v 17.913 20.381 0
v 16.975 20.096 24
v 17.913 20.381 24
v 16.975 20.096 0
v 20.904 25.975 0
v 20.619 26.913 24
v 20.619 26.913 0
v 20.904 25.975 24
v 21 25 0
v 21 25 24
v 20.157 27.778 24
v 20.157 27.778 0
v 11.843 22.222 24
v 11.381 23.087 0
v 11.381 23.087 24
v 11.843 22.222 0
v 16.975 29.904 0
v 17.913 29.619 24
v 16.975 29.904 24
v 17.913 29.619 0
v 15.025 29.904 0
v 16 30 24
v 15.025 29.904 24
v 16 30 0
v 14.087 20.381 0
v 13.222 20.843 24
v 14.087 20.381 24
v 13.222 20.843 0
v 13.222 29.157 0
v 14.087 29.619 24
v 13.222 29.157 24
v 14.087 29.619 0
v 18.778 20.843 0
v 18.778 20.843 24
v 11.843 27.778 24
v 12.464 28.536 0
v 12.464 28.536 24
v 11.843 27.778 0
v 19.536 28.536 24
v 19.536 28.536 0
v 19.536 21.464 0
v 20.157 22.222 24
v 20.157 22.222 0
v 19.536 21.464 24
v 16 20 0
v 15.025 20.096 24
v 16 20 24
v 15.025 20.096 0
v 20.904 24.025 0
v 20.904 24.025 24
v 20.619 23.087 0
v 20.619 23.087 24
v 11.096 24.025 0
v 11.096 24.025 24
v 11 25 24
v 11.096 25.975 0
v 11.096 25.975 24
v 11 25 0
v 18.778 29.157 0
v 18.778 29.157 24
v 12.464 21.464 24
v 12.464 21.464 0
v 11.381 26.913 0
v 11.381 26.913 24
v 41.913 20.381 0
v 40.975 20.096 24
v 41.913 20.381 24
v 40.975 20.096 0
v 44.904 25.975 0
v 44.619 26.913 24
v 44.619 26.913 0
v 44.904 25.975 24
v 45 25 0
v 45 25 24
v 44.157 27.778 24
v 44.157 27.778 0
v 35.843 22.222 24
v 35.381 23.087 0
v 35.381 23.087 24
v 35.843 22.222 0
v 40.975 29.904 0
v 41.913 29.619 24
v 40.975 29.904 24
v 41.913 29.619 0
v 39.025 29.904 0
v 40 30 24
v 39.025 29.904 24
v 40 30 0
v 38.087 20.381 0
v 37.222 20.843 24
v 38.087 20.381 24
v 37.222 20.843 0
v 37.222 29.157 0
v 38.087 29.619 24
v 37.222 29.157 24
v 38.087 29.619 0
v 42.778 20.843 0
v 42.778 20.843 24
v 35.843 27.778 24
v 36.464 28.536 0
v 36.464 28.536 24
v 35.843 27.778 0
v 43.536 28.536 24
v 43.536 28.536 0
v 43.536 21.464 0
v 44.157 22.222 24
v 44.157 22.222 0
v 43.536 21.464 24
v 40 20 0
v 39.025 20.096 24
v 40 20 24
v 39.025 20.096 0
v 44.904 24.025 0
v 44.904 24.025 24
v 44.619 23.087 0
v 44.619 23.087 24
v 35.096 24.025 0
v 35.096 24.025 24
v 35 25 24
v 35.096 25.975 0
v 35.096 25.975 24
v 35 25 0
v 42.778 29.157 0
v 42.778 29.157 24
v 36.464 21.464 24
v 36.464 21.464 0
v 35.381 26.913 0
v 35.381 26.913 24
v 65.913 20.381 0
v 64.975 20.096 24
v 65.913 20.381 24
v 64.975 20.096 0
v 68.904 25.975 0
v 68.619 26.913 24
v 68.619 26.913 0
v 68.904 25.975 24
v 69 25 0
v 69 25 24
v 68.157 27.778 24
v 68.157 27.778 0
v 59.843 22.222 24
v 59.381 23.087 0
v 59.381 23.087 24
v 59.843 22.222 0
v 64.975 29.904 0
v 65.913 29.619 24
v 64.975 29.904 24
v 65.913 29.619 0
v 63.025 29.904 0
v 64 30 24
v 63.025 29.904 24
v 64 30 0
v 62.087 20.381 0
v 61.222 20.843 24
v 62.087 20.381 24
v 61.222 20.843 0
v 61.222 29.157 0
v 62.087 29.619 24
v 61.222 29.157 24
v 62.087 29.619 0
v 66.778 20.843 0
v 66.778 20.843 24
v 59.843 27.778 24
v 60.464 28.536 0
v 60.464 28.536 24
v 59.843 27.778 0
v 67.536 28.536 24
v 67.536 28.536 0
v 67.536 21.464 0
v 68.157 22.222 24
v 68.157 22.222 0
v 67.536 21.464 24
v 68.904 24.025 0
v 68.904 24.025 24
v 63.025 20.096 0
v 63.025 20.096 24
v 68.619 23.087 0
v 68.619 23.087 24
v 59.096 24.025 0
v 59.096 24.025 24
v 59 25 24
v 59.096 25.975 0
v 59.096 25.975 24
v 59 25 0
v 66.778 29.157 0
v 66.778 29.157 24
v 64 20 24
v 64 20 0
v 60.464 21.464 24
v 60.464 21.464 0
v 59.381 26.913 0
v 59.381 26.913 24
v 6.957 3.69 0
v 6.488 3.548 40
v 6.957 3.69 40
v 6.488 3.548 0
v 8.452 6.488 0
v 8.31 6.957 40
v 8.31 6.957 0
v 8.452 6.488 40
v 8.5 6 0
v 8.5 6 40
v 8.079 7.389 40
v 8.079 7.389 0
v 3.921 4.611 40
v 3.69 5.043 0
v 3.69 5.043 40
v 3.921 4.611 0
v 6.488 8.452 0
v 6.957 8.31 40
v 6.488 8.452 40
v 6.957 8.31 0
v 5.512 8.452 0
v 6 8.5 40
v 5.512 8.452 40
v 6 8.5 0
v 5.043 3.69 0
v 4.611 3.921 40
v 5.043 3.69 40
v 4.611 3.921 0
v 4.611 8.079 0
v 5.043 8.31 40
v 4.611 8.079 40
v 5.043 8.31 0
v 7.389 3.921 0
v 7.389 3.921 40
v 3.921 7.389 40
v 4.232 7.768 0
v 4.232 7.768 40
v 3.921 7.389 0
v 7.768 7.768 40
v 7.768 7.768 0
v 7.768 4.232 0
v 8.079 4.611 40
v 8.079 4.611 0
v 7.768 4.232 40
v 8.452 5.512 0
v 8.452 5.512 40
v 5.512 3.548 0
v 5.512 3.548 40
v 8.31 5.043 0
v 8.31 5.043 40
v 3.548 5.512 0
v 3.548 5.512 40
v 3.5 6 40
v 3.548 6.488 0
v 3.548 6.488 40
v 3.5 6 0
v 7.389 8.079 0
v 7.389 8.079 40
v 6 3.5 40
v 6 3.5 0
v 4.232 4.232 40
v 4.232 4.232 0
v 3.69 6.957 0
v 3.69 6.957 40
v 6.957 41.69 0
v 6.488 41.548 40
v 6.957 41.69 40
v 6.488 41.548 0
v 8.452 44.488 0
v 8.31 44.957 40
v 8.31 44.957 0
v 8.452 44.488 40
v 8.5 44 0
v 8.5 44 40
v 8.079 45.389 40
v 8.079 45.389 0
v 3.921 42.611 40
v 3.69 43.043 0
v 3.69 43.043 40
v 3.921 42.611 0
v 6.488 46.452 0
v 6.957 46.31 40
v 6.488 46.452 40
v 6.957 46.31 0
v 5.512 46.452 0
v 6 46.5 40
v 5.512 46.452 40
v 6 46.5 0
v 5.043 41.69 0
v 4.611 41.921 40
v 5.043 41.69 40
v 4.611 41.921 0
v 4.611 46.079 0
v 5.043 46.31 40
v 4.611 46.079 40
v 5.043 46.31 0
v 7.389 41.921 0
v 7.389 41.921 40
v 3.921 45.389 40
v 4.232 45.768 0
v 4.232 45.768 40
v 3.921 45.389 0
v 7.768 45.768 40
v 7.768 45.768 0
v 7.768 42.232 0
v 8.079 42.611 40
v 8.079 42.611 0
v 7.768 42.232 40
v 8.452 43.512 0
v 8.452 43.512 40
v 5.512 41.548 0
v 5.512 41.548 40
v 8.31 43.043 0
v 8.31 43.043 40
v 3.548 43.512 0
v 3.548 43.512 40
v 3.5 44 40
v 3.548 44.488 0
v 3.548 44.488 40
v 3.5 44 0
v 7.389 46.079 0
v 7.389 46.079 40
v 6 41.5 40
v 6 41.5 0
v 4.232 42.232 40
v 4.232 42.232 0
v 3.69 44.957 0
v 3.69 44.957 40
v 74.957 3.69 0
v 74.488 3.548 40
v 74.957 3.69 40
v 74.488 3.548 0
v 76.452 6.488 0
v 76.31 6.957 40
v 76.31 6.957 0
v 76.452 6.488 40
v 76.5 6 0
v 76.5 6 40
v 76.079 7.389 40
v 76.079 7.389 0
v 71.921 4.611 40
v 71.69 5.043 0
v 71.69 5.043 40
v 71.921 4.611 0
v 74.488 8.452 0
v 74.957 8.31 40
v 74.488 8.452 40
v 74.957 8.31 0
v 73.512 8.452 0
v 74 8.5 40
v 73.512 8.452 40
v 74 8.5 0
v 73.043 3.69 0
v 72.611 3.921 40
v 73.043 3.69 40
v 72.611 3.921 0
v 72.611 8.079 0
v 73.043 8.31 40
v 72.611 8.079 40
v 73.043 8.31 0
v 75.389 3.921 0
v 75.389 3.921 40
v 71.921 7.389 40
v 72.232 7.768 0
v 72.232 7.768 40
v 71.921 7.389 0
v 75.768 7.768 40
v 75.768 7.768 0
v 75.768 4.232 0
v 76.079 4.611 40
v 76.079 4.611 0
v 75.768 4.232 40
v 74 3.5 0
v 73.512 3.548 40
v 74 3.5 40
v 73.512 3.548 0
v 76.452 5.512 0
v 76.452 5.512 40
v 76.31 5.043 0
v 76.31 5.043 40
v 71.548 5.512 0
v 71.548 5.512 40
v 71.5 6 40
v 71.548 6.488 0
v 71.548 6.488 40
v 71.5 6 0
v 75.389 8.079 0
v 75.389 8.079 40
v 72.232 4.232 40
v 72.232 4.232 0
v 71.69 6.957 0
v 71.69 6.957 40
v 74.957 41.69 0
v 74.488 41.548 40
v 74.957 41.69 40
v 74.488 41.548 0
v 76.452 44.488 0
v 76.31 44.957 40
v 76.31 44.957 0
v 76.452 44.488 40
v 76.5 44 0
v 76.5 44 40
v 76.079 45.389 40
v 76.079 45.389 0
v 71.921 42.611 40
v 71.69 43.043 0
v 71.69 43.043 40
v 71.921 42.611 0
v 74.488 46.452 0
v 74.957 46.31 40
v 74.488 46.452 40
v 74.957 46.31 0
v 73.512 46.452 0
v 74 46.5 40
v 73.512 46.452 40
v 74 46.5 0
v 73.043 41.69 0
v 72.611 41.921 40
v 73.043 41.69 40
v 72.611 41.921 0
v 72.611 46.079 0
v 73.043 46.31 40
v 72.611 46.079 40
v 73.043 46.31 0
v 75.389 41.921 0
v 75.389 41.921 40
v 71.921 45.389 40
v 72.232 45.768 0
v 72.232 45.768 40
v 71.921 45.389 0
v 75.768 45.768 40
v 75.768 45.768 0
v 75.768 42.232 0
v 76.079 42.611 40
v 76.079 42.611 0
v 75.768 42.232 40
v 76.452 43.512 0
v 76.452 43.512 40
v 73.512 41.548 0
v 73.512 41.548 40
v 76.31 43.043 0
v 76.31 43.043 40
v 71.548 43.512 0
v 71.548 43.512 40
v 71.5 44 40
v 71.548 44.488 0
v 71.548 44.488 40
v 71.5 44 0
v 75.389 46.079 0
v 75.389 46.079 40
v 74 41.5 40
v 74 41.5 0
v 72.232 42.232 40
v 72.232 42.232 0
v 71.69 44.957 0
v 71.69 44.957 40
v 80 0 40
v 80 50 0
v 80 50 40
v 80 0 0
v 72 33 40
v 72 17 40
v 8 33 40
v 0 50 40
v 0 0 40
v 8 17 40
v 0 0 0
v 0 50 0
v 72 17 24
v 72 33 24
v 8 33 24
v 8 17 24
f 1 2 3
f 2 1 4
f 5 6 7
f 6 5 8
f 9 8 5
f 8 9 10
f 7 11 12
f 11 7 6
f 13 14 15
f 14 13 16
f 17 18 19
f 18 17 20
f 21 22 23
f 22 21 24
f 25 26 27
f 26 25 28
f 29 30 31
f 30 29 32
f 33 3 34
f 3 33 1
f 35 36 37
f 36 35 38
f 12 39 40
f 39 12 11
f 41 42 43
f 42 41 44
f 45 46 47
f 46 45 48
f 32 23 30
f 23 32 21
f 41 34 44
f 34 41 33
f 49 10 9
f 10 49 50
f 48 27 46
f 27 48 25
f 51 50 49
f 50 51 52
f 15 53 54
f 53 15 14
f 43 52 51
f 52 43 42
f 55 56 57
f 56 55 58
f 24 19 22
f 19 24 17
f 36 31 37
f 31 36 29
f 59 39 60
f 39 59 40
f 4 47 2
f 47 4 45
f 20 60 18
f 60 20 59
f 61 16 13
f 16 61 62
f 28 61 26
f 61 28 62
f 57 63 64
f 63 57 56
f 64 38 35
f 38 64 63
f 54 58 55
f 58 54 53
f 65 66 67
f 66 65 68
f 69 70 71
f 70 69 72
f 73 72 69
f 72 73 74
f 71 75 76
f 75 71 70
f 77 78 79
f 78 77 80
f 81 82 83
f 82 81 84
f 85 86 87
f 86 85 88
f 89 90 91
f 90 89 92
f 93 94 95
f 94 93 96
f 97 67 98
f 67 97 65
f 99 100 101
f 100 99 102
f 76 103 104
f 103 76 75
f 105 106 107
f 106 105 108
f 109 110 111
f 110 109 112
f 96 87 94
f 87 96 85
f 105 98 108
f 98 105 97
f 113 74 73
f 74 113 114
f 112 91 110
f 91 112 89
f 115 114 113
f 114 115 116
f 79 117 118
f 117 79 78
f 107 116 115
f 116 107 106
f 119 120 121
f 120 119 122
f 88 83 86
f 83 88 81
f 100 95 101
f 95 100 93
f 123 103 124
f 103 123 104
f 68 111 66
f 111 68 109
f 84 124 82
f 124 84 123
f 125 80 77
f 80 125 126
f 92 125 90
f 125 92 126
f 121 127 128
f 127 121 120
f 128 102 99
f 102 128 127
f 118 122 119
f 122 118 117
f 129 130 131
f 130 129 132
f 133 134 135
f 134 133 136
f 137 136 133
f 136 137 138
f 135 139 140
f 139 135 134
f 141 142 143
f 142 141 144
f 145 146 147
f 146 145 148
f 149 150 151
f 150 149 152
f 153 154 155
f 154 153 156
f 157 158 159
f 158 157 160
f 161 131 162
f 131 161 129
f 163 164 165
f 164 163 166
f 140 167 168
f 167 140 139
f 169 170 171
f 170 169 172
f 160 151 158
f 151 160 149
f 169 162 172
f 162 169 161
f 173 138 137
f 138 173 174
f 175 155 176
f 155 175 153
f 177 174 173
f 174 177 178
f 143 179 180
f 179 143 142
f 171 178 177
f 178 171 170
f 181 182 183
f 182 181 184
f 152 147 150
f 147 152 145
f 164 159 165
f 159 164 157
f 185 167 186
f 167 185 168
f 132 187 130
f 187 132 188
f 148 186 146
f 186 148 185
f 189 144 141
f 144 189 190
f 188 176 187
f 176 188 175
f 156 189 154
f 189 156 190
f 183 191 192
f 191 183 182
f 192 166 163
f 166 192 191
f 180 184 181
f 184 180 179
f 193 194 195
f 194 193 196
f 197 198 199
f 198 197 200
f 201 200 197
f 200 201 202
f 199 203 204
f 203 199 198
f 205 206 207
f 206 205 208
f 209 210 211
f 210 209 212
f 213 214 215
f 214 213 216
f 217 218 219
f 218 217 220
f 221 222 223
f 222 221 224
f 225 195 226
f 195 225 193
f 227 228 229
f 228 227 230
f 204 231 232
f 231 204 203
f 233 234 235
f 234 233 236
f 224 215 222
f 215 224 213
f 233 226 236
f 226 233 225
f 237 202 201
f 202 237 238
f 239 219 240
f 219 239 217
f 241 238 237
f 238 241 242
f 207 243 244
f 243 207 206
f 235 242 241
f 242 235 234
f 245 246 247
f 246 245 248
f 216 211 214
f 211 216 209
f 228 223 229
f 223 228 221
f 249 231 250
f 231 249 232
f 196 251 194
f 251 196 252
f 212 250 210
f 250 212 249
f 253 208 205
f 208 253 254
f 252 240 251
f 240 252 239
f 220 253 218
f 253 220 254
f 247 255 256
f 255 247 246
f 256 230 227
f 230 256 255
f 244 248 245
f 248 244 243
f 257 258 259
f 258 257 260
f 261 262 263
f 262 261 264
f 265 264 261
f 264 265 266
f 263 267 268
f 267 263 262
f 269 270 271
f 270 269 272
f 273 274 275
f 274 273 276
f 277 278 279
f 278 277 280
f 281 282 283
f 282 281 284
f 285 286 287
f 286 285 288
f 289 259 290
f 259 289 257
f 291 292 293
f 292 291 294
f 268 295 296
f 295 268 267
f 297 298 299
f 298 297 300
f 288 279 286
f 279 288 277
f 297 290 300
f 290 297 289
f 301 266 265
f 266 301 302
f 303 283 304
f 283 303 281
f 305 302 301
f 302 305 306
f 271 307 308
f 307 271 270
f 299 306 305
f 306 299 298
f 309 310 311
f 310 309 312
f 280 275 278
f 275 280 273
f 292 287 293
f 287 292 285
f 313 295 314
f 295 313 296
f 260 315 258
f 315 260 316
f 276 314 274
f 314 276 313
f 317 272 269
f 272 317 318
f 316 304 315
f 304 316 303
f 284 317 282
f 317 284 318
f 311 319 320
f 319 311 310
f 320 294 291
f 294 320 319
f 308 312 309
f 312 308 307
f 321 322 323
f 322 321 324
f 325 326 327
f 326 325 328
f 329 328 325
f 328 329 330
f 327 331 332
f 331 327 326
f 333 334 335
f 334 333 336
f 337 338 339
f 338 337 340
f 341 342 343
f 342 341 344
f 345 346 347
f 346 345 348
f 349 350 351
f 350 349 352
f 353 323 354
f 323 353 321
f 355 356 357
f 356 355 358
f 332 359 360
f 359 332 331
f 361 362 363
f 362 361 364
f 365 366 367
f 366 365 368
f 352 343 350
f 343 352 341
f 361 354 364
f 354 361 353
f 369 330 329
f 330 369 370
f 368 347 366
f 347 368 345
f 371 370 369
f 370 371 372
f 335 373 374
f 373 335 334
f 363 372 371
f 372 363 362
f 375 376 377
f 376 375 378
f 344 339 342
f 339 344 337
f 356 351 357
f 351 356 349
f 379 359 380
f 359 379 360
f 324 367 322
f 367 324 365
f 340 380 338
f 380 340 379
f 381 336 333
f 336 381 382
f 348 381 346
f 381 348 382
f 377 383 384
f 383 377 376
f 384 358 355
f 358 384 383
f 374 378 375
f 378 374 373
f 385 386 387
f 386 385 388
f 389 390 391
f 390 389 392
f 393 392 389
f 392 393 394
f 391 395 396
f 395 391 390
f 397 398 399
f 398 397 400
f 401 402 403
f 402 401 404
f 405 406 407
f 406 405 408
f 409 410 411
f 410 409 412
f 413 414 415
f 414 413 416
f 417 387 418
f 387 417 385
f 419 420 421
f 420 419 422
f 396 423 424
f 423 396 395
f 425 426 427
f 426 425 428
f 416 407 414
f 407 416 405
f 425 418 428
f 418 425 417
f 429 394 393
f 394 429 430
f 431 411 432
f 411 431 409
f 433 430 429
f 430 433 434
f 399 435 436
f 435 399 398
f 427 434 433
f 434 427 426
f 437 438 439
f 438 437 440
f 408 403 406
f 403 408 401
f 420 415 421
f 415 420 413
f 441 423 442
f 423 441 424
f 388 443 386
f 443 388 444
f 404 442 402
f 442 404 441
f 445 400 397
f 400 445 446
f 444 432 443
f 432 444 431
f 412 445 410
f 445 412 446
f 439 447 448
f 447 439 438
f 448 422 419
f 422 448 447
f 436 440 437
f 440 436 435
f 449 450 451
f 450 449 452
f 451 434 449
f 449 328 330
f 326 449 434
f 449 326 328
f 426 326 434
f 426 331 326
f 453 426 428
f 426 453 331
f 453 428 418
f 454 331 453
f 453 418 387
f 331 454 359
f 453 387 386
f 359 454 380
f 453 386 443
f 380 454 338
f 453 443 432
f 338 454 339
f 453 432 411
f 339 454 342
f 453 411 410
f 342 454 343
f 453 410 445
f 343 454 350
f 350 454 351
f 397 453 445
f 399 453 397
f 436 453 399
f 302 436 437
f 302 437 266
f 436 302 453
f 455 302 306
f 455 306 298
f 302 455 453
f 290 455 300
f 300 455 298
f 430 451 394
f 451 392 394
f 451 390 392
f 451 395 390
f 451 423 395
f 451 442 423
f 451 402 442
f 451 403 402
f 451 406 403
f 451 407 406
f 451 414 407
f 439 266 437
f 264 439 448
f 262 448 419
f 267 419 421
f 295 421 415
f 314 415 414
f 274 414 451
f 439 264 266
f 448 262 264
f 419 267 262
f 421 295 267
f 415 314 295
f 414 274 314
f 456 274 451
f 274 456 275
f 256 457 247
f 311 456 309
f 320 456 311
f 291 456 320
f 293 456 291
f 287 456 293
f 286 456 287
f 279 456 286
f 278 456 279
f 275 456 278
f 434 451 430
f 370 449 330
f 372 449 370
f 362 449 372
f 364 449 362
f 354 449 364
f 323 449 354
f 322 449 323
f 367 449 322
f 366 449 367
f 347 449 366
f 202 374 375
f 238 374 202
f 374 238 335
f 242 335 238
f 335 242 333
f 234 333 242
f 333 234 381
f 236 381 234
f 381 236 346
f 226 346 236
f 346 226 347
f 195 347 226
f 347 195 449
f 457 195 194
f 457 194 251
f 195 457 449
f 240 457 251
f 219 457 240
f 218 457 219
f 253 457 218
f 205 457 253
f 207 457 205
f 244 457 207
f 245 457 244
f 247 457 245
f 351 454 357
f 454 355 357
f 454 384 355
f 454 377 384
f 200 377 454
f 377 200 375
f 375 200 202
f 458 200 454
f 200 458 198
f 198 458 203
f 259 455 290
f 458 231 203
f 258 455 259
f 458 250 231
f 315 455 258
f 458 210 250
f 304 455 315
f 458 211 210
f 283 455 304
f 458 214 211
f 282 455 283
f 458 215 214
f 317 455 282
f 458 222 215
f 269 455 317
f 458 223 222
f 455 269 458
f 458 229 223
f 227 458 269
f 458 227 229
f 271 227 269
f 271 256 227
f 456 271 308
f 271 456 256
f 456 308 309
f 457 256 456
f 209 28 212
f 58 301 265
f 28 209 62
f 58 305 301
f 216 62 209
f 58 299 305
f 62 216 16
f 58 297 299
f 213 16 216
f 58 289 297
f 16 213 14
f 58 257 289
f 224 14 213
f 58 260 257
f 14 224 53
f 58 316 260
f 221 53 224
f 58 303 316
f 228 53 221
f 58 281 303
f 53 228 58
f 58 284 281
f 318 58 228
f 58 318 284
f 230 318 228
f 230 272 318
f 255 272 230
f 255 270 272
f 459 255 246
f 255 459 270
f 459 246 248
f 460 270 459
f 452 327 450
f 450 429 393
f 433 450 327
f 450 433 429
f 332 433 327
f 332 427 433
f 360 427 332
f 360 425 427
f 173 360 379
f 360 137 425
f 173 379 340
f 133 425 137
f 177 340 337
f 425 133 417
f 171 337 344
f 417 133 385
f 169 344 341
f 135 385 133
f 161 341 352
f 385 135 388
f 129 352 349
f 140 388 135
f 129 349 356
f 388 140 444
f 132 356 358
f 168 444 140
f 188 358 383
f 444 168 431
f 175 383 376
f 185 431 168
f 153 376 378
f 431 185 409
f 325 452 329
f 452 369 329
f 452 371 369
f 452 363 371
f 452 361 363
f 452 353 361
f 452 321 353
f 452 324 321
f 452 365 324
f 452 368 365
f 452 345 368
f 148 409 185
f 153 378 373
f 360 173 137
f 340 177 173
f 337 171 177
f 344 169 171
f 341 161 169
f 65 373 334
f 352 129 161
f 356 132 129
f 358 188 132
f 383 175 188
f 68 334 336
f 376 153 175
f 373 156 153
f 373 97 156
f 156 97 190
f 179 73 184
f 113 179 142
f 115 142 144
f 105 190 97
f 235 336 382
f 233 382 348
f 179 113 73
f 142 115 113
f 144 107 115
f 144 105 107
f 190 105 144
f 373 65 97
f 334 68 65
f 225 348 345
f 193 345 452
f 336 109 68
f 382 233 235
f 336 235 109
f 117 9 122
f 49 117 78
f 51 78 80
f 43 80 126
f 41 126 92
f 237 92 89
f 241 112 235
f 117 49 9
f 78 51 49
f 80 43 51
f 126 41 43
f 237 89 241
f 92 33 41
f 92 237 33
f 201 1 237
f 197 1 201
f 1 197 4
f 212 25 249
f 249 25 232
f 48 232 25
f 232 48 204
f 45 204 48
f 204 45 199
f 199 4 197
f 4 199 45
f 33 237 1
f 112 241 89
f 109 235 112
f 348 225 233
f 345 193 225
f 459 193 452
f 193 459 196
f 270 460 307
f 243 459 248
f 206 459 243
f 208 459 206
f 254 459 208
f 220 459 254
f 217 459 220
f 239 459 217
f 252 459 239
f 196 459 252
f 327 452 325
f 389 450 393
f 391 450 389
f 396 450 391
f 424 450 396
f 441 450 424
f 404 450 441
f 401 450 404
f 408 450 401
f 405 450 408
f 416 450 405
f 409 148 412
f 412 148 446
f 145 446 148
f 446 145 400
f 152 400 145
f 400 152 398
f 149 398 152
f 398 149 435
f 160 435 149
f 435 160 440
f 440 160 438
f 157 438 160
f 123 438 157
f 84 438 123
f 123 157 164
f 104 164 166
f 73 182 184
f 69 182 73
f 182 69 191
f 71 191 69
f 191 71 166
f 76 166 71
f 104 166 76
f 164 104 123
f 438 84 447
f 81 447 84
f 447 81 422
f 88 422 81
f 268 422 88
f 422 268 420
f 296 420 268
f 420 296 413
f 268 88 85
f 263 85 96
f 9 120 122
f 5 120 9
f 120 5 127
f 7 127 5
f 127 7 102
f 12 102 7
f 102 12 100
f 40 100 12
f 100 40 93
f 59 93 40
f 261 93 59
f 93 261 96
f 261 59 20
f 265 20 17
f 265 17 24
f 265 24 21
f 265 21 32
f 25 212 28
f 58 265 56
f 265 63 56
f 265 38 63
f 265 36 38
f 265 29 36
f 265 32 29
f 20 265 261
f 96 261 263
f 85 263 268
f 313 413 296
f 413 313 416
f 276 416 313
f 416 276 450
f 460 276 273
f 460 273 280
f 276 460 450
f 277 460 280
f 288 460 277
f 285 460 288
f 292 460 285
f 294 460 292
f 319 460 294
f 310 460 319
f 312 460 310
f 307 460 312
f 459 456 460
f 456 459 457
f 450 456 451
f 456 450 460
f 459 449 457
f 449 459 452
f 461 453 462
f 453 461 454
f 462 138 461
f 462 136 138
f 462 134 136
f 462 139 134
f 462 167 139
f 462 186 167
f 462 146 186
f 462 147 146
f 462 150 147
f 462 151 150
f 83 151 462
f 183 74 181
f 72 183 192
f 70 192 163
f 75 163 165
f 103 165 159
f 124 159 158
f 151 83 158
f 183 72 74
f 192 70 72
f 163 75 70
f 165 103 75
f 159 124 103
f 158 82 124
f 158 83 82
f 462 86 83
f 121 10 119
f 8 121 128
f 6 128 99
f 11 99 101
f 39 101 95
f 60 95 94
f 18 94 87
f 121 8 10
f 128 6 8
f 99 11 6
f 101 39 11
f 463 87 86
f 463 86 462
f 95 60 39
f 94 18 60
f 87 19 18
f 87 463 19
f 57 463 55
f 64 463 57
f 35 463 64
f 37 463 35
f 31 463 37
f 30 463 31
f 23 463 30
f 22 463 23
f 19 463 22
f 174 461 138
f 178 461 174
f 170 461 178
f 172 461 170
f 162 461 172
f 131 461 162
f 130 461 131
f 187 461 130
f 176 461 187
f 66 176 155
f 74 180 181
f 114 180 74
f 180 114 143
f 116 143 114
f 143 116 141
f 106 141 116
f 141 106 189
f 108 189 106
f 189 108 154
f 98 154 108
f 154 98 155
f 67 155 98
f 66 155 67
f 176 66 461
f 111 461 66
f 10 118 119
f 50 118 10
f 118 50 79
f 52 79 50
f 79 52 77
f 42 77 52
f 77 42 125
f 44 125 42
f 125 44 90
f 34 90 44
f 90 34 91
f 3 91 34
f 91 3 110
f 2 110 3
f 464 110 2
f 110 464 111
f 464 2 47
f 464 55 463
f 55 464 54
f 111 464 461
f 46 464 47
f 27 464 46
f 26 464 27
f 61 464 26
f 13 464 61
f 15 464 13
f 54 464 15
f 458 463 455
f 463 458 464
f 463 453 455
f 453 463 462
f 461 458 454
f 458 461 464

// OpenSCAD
$fn = 32;

// ----------------------------------------------------------------------
// Manifold block: gallery_top manifold
// ----------------------------------------------------------------------

// --- parameters (mm) ---
block_l = 80;             // block length, X
block_w = 50;             // block width, Y
block_h = 40;             // block height, Z
port_d = 10;              // port bore diameter
port_pitch = 24;          // port pitch along X
gallery_d = 16;           // top gallery width, Y
gallery_depth = 16;       // gallery pocket depth
wall_p = 8;               // gallery end wall thickness, X
mnt_d = 5;                // mounting hole diameter
mnt_in = 6;               // mounting hole inset from the edges

n_ports = 3;  // ports in the row
port_x0 = (block_l - (n_ports - 1) * port_pitch) / 2;  // first port X

difference() {
  cube([block_l, block_w, block_h]);
  for (i = [0 : n_ports - 1])
    translate([port_x0 + i * port_pitch, block_w / 2, -1])
      cylinder(h = block_h + 2, d = port_d);
  translate([wall_p, block_w / 2 - gallery_d / 2, block_h - gallery_depth])
    cube([block_l - 2 * wall_p, gallery_d, gallery_depth + 1]);
  for (cx = [mnt_in, block_l - mnt_in])
    for (cy = [mnt_in, block_w - mnt_in])
      translate([cx, cy, -1]) cylinder(h = block_h + 2, d = mnt_d);
}
